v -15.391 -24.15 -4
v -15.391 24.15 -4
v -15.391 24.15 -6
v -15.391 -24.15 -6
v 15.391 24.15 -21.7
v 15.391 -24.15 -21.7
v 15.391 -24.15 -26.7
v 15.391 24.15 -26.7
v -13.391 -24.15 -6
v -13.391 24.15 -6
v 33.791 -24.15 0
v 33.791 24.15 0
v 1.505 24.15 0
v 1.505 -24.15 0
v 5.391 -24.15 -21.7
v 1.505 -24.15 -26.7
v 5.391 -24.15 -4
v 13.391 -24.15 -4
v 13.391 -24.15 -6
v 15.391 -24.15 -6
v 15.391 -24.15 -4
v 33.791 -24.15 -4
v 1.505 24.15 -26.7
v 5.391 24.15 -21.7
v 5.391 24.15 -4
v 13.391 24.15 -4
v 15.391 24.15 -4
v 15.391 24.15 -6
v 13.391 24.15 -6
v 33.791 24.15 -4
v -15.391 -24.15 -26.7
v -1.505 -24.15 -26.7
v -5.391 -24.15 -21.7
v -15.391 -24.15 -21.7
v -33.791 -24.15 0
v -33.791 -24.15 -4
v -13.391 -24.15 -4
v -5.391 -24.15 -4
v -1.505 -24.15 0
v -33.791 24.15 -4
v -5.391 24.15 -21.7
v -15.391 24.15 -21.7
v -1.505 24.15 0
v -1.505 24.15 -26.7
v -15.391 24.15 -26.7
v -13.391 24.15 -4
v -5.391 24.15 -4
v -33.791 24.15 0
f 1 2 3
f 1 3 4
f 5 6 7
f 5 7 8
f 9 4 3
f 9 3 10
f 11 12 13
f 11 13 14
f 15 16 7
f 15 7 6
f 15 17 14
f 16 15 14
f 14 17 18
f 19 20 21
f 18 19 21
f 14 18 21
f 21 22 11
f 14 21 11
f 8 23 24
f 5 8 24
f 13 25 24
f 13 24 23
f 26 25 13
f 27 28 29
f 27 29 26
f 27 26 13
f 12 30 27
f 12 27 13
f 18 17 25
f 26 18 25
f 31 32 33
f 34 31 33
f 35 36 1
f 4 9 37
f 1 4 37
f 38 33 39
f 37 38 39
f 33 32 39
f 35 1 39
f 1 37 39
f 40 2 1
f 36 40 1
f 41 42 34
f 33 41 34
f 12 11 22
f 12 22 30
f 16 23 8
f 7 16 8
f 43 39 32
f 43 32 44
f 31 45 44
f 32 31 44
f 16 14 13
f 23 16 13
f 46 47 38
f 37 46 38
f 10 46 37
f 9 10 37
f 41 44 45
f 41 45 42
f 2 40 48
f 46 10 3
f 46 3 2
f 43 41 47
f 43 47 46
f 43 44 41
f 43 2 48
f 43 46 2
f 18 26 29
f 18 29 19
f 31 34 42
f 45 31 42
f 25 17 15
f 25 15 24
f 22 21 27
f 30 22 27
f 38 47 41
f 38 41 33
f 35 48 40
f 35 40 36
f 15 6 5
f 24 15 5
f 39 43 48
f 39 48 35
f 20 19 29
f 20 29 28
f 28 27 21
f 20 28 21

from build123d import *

# Parameters (mm, degrees)
F0_W      = 30.7817
F0_H      = 48.3
F1_DEPTH  = 26.7
F2_W      = 48.3
F2_H      = 21.7
F4_DEPTH  = 10
F3_W      = 48.3
F3_H      = 21.7
F5_DEPTH  = 10
F7_W      = 48.3
F7_H      = 4
F8_DEPTH  = 28.4
F6_W      = 48.3
F6_H      = 4
F9_DEPTH  = 28.4
F10_W     = 2
F10_H     = 48.3
F11_DEPTH = 2
F12_W     = 2
F12_H     = 48.3
F13_DEPTH = 2
F14_W     = 0.01
F14_H     = 48.3
F15_DEPTH = 26.7
F16_DEPTH = 1.5
F17_DEPTH = 1.5


with BuildPart() as f1:
    # F0 (on Top) → F1 (new body)
    with BuildSketch(Plane.XY):
        Rectangle(F0_W, F0_H)
    extrude(amount=-F1_DEPTH)

    # F2 (on face) → F4 (cut)
    with BuildSketch(Plane.YZ.offset(15.39085)):
        with Locations((0, -10.85)):
            Rectangle(F2_W, F2_H)
    extrude(amount=-F4_DEPTH, mode=Mode.SUBTRACT)

    # F3 (on face) → F5 (cut)
    with BuildSketch(Plane(origin=(-15.39085, 0, 0), x_dir=(0, -1, 0), z_dir=(-1, 0, 0))):
        with Locations((0, -10.85)):
            Rectangle(F3_W, F3_H)
    extrude(amount=-F5_DEPTH, mode=Mode.SUBTRACT)

    # F7 (on face) → F8 (join)
    with BuildSketch(Plane.YZ.offset(5.39085)):
        with Locations((0, -2)):
            Rectangle(F7_W, F7_H)
    extrude(amount=F8_DEPTH)

    # F6 (on face) → F9 (join)
    with BuildSketch(Plane(origin=(-5.39085, 0, 0), x_dir=(0, -1, 0), z_dir=(-1, 0, 0))):
        with Locations((0, -2)):
            Rectangle(F6_W, F6_H)
    extrude(amount=F9_DEPTH)

    # F10 (on face) → F11 (join)
    with BuildSketch(Plane(origin=(0, 0, -4), x_dir=(1, 0, 0), z_dir=(0, 0, -1))):
        with Locations((14.39085, 0)):
            Rectangle(F10_W, F10_H)
    extrude(amount=F11_DEPTH)

    # F12 (on face) → F13 (join)
    with BuildSketch(Plane(origin=(0, 0, -4), x_dir=(1, 0, 0), z_dir=(0, 0, -1))):
        with Locations((-14.39085, 0)):
            Rectangle(F12_W, F12_H)
    extrude(amount=F13_DEPTH)

    # F14 (on face) → F15 (cut, through all)
    with BuildSketch(Plane.XY):
        Rectangle(F14_W, F14_H)
    extrude(amount=-F15_DEPTH, mode=Mode.SUBTRACT)

    # F16 (cut): a face of the model
    f16_faces = [f1.faces().sort_by_distance(p)[0] for p in [
        (0.005, 0, -13.35),
    ]]
    extrude(f16_faces, amount=-F16_DEPTH, mode=Mode.SUBTRACT)

    # F17 (cut): a face of the model
    f17_faces = [f1.faces().sort_by_distance(p)[0] for p in [
        (-0.005, 0, -13.35),
    ]]
    extrude(f17_faces, amount=-F17_DEPTH, mode=Mode.SUBTRACT)


solid = f1.part
